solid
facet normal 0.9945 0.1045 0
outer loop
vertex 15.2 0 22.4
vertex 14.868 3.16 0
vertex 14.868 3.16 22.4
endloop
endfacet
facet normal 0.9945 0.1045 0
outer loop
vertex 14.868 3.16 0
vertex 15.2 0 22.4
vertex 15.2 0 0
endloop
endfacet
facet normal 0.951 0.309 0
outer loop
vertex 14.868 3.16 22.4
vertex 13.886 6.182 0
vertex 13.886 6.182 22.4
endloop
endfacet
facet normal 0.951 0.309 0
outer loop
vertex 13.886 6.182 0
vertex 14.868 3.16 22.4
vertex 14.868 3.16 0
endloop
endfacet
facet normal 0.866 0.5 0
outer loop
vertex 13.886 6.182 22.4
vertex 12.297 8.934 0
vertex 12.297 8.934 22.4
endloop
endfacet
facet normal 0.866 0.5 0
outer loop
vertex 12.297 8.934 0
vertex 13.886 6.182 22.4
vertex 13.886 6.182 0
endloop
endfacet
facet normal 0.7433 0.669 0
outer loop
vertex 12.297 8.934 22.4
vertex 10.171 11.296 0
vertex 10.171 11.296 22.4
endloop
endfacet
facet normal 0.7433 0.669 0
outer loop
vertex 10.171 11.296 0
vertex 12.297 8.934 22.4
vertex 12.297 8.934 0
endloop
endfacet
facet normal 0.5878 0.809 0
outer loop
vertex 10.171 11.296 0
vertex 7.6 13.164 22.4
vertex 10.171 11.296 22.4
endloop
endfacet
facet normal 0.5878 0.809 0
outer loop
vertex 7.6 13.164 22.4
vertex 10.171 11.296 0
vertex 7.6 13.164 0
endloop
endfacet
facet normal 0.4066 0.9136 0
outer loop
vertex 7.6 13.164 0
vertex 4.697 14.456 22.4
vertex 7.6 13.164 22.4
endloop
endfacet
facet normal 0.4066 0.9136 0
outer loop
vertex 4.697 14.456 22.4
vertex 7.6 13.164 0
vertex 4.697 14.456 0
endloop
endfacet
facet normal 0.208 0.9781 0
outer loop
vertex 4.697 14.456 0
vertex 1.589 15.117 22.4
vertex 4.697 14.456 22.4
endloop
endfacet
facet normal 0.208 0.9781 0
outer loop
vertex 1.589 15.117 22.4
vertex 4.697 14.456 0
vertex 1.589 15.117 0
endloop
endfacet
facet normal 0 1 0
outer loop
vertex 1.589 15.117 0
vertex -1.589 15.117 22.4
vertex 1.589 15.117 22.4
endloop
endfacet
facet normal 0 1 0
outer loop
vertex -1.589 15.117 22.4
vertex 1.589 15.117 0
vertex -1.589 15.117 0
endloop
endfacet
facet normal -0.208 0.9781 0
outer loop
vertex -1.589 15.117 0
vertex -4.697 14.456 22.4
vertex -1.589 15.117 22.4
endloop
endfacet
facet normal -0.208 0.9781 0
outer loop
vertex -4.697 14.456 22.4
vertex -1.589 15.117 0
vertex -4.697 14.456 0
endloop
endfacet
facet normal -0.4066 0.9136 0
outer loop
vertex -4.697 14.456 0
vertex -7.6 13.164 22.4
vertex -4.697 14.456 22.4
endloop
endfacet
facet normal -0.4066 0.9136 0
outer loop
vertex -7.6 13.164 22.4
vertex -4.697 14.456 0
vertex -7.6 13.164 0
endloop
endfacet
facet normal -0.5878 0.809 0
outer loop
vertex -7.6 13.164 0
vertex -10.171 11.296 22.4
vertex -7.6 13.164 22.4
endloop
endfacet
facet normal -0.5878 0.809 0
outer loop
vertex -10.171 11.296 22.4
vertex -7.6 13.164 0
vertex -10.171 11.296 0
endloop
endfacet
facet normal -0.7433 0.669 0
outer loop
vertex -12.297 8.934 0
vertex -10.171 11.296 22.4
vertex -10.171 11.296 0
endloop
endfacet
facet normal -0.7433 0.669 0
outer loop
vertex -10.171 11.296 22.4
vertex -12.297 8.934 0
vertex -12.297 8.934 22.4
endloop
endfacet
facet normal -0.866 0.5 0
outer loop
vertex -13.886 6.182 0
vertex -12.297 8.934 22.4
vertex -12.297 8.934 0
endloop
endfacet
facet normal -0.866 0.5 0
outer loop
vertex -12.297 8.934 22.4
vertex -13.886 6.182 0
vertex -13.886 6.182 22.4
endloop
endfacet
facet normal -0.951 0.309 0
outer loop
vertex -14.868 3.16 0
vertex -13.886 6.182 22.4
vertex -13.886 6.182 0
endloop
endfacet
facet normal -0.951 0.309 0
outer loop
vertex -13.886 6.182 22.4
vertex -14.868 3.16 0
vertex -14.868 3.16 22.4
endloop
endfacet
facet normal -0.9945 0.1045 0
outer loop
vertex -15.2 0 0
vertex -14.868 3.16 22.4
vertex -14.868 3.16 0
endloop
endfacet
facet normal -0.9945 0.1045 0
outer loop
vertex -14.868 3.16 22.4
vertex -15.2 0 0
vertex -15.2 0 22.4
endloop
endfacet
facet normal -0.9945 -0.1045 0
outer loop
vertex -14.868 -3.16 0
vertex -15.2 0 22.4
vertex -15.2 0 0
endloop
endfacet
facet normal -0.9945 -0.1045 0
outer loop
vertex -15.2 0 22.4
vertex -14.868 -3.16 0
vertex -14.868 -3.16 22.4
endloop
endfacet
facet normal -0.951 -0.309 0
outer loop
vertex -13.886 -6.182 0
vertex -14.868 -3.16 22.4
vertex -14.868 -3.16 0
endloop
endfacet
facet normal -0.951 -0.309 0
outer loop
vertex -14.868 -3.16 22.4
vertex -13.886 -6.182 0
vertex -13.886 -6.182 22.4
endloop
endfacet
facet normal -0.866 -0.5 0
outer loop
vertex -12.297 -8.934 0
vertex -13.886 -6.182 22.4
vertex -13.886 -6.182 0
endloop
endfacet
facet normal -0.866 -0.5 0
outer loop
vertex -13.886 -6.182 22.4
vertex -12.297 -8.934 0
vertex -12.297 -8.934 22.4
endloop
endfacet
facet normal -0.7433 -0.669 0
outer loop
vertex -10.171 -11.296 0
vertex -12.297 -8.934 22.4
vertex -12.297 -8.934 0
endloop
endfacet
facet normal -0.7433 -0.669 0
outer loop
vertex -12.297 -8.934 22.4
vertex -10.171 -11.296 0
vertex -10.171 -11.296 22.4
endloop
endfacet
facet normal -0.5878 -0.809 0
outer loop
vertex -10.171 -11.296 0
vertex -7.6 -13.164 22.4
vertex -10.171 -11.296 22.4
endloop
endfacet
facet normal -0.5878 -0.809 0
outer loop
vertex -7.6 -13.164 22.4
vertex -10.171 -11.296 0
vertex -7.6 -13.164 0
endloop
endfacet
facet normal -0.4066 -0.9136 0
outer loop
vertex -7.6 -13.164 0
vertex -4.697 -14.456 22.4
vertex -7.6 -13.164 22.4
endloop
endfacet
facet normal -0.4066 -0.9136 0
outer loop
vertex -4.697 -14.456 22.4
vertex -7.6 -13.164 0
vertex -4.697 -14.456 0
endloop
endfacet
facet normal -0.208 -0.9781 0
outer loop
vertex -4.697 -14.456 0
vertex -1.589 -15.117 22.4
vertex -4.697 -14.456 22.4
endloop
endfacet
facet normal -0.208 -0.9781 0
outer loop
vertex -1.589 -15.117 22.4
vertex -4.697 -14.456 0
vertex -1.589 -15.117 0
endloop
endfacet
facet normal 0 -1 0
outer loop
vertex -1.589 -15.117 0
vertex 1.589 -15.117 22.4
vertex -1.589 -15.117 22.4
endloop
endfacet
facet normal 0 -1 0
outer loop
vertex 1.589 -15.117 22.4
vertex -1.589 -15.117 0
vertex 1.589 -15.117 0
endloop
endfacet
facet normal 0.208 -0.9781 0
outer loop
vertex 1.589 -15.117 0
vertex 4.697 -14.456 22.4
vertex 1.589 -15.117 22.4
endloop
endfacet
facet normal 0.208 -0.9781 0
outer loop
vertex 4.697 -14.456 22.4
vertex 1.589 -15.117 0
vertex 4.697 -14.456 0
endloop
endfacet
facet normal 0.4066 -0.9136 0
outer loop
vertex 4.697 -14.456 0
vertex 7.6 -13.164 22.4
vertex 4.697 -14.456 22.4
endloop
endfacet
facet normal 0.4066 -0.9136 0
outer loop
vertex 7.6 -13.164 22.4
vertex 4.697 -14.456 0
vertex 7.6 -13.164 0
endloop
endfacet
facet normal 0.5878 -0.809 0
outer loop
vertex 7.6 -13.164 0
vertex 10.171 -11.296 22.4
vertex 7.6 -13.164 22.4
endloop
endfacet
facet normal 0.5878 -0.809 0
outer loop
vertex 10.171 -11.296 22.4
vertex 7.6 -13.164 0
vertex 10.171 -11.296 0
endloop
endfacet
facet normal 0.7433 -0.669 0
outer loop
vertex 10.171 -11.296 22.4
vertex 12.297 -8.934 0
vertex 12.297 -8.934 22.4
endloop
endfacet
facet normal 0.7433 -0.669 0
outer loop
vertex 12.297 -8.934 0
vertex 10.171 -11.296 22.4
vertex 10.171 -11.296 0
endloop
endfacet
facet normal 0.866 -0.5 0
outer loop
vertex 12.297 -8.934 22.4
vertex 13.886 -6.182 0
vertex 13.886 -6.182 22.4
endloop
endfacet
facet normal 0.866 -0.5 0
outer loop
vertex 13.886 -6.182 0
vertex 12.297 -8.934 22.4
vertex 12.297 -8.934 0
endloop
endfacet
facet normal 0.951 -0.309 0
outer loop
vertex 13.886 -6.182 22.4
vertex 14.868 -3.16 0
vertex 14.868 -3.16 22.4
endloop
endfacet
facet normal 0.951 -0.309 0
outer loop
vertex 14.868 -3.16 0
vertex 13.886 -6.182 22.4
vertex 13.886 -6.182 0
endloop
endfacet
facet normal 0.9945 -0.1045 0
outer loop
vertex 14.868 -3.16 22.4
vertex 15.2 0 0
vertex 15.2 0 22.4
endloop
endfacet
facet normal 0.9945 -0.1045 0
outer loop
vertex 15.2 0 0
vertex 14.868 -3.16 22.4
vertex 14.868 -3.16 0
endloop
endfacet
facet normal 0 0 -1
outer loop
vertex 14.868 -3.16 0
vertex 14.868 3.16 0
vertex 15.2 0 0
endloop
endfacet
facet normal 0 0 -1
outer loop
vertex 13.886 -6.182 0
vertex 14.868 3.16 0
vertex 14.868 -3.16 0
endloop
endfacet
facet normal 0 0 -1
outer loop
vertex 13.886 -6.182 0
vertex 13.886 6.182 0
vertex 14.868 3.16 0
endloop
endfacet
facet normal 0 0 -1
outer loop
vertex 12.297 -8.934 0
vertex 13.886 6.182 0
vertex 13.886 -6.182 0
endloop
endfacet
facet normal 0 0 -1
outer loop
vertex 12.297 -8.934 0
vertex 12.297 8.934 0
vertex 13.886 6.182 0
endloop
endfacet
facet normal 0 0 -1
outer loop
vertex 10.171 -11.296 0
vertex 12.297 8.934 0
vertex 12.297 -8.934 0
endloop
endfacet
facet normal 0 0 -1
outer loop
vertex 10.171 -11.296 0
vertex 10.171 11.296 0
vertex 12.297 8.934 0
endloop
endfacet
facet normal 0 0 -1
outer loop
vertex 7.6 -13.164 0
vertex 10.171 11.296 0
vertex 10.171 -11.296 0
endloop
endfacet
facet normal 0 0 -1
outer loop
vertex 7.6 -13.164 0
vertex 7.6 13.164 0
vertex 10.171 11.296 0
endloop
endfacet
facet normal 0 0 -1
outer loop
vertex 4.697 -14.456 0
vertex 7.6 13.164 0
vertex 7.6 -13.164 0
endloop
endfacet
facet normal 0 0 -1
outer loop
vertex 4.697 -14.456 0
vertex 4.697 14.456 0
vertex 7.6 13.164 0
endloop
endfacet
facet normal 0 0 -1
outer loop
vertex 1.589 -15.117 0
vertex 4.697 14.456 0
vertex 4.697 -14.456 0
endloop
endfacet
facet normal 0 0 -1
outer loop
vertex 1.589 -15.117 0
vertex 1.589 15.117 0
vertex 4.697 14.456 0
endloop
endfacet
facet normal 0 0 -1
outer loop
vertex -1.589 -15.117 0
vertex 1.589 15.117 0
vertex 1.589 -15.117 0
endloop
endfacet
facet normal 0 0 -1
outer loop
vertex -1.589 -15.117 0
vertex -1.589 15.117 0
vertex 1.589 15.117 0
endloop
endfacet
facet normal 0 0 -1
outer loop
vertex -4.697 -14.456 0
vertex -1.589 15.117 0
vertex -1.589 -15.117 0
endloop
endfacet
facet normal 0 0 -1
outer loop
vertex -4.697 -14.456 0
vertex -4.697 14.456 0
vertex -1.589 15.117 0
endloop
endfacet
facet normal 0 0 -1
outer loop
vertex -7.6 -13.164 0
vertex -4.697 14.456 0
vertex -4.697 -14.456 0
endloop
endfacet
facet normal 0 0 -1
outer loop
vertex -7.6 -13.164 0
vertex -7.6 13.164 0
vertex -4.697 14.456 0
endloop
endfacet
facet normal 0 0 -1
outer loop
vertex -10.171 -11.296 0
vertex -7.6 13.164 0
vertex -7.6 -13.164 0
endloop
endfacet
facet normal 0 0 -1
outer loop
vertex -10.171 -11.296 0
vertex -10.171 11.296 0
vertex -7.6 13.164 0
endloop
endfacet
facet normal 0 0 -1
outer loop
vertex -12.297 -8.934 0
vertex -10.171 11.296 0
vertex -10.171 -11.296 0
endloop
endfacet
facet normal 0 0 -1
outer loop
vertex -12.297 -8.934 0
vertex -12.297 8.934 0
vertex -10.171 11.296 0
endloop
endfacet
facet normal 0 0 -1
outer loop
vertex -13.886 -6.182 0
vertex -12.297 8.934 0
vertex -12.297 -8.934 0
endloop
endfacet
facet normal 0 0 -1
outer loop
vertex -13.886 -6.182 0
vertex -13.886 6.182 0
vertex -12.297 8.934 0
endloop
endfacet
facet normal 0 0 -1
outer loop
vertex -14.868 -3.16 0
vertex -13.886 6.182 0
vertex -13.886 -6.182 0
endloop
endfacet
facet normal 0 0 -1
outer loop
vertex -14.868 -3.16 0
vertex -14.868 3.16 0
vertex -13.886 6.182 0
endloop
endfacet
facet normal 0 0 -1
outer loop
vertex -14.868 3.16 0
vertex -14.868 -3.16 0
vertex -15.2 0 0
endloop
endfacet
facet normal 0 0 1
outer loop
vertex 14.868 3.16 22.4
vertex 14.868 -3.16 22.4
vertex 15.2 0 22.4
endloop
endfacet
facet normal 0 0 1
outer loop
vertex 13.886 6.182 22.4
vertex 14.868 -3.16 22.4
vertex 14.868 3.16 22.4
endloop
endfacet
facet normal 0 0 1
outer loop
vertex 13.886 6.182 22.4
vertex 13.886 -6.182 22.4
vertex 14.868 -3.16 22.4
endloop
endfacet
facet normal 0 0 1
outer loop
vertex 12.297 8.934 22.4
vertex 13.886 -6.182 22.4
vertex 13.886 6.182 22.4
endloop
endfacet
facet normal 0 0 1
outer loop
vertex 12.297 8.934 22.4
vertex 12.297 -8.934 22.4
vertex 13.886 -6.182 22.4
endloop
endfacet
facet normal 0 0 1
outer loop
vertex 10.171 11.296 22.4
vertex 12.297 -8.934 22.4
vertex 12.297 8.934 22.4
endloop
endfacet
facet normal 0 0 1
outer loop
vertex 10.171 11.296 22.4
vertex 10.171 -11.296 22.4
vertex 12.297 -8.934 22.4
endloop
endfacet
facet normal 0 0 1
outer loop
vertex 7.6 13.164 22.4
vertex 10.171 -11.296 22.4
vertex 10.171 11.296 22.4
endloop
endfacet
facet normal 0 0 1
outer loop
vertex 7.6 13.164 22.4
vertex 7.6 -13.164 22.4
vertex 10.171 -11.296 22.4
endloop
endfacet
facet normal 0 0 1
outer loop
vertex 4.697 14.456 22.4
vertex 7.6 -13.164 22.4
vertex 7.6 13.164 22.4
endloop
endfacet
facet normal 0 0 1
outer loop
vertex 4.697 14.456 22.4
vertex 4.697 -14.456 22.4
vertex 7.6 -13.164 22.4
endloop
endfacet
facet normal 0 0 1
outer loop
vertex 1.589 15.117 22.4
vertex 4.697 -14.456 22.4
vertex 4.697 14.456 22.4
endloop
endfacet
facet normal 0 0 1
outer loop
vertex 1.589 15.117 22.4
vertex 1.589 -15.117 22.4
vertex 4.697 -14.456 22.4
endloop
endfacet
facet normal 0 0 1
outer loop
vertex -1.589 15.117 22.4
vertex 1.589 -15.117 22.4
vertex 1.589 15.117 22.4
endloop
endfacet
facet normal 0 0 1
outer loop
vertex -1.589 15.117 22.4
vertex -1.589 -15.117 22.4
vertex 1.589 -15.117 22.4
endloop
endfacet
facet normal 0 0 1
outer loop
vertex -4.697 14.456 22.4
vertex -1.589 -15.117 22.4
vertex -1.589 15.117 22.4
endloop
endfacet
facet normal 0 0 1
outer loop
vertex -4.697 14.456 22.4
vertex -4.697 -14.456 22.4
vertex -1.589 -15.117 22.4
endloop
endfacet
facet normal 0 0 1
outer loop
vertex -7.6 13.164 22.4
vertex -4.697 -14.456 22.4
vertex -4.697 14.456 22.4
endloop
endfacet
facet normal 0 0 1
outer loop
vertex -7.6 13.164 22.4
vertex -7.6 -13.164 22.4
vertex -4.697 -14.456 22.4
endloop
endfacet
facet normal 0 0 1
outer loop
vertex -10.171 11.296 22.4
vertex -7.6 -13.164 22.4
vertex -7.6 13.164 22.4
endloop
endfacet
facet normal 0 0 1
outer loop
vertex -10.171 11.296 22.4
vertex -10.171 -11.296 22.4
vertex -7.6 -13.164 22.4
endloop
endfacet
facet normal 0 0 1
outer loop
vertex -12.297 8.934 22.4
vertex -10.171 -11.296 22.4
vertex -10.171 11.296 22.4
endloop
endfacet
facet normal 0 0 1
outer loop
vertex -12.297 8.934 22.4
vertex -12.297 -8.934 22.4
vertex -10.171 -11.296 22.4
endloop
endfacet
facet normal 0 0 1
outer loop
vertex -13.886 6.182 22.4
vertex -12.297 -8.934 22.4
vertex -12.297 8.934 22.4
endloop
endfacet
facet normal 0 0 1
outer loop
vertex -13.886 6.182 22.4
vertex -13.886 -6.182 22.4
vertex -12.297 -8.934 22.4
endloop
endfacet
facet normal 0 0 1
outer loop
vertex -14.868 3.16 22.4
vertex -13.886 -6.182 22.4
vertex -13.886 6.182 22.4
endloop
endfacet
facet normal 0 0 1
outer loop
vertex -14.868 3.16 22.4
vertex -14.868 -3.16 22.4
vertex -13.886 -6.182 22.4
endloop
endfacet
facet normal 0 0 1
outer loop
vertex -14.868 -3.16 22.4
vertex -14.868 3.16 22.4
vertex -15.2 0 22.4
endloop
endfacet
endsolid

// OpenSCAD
function PulleyBodyWidth(3dPrinterTolerance=.4) = 22 + 3dPrinterTolerance;
function PulleyDiam(3dPrinterTolerance=.4) = 30 + 3dPrinterTolerance;

module Pulley(3dPrinterTolerance=.4)
{
	cylinder(PulleyBodyWidth(3dPrinterTolerance), PulleyDiam(3dPrinterTolerance)/2, PulleyDiam(3dPrinterTolerance)/2);
}

Pulley();
